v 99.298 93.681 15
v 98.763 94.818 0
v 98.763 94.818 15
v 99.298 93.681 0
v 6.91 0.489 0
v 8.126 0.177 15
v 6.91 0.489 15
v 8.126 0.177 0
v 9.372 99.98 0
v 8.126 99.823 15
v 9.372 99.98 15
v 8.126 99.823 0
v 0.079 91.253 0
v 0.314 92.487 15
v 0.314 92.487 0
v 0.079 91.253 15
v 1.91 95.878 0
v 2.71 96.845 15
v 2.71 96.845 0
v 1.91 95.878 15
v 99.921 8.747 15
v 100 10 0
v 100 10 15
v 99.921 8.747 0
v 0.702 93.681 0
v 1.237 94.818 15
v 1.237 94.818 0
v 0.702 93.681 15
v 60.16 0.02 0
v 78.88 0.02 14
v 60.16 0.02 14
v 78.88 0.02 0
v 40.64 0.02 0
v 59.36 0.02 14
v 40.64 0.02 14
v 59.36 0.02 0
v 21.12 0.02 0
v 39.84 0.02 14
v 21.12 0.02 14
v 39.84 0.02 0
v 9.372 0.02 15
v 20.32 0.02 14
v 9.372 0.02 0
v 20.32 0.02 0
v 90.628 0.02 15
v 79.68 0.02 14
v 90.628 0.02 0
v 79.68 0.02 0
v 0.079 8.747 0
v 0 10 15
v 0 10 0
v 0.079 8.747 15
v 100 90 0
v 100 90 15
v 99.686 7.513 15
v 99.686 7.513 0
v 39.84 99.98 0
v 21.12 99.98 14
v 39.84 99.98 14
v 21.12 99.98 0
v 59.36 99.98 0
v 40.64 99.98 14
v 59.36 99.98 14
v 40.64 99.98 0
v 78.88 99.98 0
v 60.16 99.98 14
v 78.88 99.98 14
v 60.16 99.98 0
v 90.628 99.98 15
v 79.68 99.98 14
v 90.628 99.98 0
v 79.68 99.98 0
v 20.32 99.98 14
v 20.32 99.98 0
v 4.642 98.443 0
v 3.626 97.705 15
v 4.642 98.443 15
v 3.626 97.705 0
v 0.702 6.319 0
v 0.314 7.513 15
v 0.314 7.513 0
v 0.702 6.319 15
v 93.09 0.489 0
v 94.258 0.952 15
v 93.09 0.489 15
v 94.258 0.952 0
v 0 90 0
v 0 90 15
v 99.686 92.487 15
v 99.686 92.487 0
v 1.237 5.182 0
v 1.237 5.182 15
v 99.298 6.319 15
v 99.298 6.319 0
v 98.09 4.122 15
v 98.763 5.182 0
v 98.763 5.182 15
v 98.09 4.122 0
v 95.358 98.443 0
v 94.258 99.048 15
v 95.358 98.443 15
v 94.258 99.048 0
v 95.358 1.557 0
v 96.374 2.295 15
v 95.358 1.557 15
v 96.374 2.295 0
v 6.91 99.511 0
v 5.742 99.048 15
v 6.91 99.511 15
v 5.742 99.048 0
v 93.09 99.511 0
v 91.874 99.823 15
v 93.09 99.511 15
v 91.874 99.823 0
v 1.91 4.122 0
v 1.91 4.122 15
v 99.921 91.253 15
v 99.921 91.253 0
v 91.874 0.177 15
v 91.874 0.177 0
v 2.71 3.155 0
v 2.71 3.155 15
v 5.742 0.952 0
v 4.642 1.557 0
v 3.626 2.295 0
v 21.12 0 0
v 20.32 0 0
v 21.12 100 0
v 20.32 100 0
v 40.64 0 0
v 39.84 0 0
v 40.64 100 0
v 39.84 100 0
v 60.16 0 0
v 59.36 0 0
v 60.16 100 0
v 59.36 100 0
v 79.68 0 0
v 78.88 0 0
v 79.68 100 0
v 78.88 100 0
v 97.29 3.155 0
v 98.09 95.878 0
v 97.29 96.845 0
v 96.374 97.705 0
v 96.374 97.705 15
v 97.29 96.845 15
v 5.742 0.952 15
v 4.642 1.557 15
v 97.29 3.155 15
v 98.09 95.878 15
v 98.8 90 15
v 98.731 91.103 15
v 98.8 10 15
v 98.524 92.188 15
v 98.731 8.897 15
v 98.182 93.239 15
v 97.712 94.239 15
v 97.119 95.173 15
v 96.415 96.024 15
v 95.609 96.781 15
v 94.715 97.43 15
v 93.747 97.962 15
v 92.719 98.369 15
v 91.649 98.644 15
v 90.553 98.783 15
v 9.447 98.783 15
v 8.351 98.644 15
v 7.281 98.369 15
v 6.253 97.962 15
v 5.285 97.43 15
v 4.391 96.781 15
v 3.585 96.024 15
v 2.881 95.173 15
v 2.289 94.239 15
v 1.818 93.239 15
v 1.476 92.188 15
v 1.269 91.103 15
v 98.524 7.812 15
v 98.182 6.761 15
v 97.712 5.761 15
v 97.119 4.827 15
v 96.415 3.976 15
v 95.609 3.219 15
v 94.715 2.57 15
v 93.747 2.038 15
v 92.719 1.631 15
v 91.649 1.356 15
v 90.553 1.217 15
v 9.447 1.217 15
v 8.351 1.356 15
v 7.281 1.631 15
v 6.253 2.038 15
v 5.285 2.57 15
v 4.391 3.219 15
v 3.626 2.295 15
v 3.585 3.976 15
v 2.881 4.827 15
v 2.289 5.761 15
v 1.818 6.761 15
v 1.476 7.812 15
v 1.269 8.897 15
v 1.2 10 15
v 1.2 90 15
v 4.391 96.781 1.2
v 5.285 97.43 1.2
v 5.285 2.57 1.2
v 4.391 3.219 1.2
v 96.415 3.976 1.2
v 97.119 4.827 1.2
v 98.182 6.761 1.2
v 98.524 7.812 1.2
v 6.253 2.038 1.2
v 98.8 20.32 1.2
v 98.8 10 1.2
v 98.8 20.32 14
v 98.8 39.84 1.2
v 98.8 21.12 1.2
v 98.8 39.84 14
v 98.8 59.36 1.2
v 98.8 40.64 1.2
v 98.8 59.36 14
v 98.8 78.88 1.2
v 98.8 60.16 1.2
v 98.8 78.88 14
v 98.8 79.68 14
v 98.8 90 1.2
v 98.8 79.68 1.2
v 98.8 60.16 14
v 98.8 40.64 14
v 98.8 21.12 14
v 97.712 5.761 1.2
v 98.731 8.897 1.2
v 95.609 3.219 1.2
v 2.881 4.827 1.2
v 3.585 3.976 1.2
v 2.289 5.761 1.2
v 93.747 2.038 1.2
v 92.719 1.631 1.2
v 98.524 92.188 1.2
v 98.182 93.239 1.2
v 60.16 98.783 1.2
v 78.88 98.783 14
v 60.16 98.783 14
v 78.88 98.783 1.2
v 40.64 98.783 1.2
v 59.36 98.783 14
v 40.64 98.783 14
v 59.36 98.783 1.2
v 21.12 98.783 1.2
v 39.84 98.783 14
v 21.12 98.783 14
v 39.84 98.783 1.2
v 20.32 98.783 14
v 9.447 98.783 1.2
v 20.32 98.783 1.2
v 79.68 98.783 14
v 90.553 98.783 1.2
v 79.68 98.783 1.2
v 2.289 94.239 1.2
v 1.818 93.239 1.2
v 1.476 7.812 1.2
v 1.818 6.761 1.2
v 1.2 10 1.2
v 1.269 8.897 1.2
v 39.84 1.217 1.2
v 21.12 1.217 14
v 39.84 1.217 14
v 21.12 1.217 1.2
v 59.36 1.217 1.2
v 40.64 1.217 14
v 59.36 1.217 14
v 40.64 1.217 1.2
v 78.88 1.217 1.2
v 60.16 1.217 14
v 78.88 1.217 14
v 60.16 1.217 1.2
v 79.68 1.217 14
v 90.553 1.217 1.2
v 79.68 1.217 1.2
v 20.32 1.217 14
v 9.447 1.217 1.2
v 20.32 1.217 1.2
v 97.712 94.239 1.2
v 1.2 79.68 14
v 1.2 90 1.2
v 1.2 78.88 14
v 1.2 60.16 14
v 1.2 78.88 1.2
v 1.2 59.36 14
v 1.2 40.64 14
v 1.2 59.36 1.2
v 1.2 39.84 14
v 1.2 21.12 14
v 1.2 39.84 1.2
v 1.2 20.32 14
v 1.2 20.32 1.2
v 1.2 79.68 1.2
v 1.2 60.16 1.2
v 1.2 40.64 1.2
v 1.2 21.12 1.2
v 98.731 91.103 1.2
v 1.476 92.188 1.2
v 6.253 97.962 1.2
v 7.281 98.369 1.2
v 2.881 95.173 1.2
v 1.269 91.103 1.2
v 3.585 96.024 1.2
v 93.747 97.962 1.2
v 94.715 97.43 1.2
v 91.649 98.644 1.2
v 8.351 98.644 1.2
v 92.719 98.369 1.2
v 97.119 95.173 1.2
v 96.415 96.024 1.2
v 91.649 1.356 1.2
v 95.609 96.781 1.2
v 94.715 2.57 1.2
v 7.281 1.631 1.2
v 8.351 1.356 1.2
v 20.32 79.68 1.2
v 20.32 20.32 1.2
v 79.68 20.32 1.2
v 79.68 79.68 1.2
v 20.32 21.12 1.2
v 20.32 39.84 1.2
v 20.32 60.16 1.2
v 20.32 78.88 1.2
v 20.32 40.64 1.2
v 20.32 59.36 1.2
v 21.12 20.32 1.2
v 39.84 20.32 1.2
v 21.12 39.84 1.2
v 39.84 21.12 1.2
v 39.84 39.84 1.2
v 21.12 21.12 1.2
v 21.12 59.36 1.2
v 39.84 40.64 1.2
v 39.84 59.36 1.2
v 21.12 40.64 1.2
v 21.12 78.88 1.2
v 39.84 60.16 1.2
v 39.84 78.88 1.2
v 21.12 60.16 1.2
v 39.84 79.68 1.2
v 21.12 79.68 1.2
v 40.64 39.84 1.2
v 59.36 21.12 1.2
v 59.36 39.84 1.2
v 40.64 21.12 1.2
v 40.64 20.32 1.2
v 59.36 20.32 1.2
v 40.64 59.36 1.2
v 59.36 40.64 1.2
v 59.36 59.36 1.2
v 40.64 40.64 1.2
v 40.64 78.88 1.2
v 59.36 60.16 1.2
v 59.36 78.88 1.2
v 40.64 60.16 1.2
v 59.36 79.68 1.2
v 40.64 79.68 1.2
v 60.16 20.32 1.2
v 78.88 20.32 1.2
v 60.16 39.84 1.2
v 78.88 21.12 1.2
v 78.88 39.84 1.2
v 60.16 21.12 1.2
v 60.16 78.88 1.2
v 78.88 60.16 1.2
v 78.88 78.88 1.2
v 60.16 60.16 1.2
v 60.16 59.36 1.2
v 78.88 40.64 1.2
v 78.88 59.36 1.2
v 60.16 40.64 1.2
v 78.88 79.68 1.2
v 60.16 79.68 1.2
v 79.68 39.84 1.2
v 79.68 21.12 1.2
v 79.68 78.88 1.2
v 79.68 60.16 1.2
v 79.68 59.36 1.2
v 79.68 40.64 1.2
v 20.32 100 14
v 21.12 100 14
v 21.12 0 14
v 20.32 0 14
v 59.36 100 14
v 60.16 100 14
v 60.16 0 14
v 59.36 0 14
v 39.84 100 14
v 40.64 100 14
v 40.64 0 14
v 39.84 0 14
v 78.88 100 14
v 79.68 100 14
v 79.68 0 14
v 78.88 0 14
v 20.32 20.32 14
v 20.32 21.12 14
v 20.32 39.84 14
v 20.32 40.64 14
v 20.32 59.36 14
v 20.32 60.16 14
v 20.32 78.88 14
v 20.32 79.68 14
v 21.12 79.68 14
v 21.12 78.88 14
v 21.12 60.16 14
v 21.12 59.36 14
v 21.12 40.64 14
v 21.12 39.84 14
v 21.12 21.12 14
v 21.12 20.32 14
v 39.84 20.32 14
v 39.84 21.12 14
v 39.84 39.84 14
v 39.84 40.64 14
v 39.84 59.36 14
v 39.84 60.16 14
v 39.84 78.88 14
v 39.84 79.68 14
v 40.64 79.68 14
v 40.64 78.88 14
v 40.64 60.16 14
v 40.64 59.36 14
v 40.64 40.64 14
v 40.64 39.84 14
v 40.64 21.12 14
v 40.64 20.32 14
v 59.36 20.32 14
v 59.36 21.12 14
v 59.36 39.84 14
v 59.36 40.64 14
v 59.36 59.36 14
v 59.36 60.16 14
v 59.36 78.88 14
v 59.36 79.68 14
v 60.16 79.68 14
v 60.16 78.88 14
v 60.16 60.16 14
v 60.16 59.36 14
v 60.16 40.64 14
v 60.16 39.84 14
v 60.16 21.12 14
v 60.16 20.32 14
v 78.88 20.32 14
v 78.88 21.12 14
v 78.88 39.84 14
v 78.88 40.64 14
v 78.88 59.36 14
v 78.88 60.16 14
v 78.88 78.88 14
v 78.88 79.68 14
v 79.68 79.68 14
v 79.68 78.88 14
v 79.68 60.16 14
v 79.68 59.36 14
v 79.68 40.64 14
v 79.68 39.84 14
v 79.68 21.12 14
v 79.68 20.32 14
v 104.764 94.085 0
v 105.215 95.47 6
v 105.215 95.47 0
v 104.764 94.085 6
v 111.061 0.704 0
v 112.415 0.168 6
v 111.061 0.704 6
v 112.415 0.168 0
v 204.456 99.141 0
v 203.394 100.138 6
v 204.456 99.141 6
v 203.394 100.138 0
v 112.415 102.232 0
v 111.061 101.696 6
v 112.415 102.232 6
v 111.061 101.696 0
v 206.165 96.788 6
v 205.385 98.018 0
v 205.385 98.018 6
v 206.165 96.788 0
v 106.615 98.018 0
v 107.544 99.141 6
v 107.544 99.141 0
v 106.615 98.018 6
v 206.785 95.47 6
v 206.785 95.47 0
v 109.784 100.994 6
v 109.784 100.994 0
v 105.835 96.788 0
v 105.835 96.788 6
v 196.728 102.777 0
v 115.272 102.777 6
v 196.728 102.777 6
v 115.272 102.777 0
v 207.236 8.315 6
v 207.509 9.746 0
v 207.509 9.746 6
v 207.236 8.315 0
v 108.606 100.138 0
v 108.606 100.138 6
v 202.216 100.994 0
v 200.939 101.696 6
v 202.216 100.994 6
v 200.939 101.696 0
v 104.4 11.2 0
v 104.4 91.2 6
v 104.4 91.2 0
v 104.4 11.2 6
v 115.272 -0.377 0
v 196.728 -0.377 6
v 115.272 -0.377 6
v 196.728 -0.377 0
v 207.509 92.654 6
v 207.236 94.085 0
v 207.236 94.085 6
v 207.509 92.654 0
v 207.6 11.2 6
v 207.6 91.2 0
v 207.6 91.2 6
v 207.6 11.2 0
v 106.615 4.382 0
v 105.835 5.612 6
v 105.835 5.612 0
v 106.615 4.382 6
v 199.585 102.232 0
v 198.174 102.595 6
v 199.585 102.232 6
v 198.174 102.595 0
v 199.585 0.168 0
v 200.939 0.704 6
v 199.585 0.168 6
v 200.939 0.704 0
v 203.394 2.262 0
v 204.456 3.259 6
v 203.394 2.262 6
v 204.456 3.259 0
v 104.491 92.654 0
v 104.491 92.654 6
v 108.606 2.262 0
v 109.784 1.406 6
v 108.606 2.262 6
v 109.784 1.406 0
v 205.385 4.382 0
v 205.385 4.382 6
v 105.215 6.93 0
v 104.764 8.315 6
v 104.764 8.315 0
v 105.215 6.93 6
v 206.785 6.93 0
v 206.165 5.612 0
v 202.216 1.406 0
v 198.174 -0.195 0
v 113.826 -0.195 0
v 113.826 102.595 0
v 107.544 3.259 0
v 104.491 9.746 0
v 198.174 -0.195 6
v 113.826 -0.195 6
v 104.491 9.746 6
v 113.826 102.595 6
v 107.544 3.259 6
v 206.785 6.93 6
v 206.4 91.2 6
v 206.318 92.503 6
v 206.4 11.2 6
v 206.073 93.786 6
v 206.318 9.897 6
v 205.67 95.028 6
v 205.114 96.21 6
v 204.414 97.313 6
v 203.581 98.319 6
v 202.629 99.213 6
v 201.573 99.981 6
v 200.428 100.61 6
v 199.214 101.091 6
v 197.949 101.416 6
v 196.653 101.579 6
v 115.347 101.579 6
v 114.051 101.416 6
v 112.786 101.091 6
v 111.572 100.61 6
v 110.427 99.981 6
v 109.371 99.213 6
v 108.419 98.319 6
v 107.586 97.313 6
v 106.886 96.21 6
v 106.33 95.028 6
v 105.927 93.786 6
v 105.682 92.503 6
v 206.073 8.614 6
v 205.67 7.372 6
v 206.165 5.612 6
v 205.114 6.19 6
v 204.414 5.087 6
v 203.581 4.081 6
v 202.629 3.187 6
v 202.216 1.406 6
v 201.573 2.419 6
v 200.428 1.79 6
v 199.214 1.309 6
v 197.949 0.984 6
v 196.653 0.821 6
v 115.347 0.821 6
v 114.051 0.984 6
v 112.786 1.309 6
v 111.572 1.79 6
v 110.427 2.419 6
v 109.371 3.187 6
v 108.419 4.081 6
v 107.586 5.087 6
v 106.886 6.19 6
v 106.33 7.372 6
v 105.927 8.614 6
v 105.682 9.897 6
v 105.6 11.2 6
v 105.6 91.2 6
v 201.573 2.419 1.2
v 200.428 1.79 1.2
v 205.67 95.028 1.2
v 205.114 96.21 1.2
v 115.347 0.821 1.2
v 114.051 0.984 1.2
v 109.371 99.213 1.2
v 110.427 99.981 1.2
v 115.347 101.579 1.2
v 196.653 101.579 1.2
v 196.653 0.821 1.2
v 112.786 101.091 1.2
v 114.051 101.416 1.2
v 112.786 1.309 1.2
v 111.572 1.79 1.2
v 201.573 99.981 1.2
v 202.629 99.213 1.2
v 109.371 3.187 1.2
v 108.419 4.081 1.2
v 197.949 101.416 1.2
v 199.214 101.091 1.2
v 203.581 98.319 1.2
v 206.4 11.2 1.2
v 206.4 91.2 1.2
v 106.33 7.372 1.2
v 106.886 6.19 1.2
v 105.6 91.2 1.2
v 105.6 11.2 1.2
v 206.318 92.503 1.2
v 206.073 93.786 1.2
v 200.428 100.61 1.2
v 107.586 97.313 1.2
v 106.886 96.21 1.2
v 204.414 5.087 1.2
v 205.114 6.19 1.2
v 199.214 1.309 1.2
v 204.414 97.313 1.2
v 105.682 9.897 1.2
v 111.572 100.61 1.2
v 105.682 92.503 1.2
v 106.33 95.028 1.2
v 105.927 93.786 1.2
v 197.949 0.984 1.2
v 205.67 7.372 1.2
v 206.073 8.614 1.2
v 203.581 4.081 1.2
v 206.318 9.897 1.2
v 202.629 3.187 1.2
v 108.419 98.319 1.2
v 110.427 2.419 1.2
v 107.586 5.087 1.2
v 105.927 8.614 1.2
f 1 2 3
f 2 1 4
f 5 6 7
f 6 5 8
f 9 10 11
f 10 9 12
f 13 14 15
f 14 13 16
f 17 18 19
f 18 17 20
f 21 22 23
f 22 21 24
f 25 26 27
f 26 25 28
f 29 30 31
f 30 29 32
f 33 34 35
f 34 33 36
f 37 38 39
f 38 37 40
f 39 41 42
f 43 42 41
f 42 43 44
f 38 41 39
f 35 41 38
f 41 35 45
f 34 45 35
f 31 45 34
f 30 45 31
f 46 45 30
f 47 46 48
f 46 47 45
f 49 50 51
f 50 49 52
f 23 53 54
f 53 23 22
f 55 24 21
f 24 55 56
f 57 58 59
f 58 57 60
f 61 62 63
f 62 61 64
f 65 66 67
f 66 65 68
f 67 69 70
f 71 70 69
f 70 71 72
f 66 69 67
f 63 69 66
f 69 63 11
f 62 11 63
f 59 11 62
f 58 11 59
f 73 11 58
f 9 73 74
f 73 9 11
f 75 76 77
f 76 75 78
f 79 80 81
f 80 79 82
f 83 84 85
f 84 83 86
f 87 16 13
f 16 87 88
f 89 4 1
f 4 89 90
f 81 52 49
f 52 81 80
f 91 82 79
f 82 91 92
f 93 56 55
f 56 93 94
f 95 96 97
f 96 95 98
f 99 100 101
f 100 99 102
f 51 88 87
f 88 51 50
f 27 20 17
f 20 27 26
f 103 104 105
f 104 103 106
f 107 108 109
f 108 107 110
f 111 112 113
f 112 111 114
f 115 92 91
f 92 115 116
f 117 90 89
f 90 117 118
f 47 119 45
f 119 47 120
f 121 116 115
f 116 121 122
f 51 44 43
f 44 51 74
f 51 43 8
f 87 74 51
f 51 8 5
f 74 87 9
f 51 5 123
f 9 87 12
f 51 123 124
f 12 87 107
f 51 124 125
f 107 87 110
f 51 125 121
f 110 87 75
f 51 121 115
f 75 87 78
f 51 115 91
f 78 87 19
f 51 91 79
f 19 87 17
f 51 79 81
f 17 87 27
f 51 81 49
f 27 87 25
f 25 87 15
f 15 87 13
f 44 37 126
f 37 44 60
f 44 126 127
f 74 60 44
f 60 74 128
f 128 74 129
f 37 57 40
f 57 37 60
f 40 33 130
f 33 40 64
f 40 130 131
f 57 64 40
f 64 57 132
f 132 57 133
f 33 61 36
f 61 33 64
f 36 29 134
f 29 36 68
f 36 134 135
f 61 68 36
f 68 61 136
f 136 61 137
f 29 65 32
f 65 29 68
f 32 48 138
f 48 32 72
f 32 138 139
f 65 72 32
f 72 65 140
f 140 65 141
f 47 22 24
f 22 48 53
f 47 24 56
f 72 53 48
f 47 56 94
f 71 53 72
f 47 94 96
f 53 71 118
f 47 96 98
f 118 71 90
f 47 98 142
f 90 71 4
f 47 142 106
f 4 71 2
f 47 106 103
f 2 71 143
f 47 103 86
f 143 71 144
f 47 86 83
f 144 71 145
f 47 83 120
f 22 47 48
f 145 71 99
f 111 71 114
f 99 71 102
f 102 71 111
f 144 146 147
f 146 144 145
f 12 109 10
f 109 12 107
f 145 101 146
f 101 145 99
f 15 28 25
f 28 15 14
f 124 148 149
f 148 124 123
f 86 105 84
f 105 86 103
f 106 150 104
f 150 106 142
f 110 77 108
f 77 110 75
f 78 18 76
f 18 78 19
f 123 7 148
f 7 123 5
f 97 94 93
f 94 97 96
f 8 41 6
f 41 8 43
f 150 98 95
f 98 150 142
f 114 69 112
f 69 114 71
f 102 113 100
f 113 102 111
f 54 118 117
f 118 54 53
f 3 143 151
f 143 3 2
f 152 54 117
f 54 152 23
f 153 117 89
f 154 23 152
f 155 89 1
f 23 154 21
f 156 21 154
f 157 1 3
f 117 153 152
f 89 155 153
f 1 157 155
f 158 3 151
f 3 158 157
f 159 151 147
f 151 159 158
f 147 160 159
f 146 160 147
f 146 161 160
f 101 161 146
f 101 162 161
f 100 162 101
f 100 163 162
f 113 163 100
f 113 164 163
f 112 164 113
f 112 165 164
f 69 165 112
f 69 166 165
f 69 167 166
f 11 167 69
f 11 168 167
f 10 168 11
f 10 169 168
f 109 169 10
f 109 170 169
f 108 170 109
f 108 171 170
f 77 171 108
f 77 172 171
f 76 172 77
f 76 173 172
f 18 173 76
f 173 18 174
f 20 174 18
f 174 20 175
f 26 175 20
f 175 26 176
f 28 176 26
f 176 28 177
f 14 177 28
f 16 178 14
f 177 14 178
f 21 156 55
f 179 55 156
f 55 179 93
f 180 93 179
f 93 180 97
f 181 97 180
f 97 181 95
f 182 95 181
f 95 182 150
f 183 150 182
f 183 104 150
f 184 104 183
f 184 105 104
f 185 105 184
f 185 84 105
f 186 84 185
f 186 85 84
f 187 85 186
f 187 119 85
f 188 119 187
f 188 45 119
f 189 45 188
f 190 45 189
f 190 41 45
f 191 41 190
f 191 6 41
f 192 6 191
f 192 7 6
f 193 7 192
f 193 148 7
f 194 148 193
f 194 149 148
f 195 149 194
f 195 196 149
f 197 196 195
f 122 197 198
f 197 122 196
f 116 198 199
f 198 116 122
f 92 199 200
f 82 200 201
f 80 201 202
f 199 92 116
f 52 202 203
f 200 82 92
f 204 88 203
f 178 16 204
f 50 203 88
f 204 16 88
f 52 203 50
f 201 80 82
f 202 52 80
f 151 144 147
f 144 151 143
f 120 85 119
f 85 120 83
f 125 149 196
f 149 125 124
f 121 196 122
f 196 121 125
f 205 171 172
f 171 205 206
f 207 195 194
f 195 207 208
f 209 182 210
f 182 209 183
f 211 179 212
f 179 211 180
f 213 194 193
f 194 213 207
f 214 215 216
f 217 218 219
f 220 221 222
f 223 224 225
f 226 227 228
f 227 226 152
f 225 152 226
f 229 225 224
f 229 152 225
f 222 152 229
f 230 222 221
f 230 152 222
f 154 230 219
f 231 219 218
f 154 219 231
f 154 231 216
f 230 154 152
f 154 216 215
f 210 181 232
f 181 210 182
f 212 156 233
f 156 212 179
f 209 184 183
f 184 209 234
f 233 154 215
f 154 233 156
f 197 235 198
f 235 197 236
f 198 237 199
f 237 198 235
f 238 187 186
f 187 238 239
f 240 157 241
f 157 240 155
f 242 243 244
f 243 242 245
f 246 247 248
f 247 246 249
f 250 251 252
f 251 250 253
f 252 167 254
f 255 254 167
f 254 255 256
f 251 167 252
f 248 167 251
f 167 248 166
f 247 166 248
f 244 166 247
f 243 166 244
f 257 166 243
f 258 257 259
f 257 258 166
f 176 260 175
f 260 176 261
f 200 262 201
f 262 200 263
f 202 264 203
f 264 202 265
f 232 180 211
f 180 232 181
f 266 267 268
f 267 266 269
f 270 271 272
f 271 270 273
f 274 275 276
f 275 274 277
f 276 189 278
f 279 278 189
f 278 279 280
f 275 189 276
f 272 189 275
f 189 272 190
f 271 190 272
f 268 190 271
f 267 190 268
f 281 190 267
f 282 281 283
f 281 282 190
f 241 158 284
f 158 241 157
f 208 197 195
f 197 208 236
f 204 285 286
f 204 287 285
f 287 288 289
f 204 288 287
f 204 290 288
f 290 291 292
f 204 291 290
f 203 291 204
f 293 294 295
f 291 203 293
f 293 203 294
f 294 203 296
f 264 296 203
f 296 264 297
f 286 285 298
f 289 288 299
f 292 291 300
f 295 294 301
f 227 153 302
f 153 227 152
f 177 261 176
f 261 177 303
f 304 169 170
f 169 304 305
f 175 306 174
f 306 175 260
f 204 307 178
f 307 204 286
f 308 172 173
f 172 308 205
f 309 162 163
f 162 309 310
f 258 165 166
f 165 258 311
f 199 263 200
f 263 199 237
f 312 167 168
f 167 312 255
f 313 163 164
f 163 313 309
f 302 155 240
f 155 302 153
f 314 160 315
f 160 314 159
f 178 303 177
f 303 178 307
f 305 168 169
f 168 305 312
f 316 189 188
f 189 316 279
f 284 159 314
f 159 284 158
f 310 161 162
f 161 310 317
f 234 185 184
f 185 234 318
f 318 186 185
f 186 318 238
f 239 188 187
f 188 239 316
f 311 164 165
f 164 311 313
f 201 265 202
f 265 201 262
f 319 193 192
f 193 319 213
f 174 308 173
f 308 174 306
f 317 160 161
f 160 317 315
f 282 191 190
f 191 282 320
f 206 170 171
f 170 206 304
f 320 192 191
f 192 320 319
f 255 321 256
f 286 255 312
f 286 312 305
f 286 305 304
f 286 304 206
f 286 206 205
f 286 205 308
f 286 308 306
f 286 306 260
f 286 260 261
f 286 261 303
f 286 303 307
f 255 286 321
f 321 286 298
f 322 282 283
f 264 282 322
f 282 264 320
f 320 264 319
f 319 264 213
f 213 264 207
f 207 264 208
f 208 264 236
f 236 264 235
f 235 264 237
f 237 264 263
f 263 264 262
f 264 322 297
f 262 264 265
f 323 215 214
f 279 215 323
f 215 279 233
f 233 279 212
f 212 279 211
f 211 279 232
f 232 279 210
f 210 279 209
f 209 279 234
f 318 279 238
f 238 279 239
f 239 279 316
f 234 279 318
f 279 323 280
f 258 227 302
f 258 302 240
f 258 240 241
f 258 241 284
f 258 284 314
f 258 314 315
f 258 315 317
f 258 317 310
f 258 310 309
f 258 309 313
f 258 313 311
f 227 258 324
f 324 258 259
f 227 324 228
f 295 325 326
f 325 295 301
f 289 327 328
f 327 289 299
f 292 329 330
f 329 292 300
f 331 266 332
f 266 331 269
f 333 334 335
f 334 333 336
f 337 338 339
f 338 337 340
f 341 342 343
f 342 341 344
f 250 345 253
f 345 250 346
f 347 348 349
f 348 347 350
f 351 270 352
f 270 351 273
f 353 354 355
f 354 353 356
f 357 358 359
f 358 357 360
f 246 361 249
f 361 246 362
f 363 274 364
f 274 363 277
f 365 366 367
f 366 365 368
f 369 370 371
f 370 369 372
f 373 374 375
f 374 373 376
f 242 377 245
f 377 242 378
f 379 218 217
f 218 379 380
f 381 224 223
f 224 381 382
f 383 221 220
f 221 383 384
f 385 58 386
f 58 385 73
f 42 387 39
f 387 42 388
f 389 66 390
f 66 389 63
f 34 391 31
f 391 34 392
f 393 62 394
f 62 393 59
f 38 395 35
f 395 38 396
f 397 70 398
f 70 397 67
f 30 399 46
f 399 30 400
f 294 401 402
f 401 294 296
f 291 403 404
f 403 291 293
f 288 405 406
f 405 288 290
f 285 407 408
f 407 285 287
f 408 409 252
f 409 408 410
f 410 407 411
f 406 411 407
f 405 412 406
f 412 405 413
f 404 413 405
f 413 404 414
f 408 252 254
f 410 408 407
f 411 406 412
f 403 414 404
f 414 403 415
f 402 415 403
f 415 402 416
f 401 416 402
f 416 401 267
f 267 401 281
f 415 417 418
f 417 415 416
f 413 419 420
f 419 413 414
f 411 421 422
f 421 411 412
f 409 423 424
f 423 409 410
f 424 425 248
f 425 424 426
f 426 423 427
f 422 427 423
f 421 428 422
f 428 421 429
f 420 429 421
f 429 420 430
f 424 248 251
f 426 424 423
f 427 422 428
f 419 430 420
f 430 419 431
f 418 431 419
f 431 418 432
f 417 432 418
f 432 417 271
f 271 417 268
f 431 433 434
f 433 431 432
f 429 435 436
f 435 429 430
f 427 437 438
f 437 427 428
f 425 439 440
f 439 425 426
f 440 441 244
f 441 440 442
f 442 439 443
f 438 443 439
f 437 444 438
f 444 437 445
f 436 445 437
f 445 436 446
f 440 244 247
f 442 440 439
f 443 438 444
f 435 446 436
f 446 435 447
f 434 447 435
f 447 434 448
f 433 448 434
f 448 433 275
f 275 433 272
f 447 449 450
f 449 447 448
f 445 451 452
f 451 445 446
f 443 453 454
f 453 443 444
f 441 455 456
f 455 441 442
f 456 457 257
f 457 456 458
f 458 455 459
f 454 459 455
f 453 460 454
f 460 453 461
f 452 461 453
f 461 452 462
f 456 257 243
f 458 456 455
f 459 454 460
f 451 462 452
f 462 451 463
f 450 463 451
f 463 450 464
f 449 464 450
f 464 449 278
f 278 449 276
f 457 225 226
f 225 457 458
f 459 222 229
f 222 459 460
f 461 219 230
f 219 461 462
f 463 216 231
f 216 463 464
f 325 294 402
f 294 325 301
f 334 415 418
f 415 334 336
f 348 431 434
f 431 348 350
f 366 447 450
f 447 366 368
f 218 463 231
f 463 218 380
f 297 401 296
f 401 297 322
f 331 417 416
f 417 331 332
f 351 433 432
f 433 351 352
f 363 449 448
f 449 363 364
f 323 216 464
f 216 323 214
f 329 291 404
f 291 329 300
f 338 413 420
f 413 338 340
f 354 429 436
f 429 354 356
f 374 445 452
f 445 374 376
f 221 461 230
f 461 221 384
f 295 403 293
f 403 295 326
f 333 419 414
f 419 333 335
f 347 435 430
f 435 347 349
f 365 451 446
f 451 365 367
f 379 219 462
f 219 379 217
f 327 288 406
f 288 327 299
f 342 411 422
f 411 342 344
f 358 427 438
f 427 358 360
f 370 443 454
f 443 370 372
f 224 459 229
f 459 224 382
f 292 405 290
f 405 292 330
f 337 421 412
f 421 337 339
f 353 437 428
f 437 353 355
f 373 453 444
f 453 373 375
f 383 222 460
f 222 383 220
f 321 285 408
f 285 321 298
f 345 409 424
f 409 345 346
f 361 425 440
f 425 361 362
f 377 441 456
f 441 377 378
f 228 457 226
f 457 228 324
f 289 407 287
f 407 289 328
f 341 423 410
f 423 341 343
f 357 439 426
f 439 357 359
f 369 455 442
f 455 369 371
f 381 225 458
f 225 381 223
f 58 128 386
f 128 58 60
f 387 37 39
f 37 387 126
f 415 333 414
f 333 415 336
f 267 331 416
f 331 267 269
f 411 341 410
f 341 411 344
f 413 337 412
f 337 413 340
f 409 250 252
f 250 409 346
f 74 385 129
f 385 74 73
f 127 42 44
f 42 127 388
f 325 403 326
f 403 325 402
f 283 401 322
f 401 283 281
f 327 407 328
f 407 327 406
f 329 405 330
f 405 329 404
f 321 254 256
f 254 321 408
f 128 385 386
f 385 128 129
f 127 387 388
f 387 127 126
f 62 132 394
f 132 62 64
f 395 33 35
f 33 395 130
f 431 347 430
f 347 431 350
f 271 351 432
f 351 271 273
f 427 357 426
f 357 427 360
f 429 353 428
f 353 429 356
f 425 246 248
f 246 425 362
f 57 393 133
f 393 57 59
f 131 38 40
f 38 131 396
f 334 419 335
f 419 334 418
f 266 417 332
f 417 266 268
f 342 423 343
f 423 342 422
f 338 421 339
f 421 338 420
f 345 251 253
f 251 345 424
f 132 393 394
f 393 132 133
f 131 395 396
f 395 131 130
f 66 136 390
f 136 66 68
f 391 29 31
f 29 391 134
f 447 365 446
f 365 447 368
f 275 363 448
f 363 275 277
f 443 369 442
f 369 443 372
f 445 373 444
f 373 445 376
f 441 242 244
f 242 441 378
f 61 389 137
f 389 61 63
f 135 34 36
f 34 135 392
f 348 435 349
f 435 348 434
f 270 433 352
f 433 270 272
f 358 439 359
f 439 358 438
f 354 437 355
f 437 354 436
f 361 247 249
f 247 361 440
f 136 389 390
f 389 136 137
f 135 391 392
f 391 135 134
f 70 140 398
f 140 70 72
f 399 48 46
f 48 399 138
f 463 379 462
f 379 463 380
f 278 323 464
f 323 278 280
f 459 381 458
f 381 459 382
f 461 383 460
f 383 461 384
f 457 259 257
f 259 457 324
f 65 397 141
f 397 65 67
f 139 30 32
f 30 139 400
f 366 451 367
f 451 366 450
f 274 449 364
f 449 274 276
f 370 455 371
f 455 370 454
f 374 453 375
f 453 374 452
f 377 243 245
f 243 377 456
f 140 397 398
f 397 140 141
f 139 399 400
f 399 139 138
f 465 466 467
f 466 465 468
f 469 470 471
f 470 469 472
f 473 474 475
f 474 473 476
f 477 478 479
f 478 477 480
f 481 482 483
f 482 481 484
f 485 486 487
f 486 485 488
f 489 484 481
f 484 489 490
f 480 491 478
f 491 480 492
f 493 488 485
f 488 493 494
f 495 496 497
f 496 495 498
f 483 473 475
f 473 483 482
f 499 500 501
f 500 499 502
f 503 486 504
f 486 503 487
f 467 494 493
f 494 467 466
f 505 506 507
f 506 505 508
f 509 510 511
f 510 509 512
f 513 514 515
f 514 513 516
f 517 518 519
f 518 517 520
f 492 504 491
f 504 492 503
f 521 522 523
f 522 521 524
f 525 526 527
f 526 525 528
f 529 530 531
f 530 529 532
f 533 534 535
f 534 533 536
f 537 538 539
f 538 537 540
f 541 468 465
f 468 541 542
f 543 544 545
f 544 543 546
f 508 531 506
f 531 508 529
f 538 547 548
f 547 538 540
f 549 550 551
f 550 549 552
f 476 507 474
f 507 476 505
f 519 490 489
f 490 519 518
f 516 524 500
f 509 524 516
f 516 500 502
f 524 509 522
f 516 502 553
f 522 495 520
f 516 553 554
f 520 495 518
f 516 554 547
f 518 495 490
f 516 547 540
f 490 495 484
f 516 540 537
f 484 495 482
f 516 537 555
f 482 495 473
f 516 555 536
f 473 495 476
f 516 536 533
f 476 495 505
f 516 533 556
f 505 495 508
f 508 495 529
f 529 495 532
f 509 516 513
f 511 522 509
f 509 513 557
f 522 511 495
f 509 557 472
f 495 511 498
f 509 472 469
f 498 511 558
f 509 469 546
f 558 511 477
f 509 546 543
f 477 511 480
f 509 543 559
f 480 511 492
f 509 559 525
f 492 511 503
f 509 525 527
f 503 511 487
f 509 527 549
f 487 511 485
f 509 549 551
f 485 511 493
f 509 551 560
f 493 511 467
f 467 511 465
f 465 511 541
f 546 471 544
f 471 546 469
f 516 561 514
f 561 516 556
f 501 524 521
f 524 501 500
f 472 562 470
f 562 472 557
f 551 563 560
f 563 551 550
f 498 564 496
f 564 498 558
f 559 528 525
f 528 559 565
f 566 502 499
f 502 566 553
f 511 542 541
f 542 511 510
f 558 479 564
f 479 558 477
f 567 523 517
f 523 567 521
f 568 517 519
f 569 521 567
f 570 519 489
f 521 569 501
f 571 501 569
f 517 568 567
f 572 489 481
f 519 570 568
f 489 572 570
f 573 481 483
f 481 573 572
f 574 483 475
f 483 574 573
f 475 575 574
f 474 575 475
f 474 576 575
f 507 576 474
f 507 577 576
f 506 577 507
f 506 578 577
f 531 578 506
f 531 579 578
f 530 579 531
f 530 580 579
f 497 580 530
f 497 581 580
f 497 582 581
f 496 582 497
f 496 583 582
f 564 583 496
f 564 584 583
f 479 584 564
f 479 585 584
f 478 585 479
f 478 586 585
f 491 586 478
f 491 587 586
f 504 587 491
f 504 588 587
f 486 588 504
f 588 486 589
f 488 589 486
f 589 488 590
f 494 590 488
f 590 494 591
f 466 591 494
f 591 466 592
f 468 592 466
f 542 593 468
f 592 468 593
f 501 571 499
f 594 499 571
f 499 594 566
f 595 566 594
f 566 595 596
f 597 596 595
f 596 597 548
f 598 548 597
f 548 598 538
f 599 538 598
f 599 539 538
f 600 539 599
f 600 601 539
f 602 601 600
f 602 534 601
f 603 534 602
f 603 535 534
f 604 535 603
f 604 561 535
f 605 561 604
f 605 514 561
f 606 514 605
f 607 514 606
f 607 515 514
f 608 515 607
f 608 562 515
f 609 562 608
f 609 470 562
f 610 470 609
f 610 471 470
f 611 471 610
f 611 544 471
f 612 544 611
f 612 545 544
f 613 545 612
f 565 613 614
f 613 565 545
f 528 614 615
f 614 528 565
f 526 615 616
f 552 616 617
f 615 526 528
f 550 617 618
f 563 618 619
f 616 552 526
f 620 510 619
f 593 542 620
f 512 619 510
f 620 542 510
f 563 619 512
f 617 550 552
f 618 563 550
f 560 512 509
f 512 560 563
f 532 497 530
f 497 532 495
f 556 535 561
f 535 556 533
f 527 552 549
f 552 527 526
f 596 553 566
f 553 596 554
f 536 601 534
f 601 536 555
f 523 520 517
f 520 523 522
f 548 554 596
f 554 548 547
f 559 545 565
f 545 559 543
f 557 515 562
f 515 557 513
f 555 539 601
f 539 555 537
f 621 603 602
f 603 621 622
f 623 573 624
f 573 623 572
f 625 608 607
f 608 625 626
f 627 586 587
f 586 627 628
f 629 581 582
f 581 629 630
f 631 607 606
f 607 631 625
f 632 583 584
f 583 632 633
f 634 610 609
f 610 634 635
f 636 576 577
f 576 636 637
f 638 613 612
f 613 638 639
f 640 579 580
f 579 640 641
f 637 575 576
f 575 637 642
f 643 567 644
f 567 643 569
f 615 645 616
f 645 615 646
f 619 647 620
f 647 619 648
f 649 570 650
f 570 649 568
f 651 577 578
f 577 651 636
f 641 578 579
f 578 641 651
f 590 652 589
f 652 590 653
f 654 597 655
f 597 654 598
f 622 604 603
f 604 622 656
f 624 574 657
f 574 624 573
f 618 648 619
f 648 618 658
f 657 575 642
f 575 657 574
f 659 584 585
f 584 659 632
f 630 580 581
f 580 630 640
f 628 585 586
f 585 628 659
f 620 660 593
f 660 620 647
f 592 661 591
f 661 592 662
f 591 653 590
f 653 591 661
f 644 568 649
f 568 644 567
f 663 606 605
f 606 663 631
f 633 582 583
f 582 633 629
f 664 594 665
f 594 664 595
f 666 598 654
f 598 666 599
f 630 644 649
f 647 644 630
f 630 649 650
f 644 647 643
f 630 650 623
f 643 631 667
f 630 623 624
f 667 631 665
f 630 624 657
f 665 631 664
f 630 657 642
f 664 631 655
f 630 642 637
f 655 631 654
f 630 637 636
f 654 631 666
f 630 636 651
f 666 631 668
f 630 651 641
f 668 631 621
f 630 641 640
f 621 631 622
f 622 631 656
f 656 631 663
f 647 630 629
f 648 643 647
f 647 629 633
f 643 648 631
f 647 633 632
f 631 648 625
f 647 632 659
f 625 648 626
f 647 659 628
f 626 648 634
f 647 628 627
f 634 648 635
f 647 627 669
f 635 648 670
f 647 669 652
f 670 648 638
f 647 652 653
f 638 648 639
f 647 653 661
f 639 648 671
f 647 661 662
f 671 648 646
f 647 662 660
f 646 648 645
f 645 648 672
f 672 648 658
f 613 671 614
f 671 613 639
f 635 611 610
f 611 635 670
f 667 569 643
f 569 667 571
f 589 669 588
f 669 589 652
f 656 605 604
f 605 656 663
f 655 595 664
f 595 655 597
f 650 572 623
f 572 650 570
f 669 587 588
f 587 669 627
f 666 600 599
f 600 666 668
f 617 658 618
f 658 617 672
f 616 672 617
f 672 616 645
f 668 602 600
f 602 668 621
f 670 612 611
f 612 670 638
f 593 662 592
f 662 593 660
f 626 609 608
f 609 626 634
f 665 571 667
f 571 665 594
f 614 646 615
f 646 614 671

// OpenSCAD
/* [Box] */
//Box height
height=15;
//Box length
length=100;
//Box width
width=100;
//Radius for corners (minimum 2)
cornerrad=10;
//Wall thickness
outwalls=1.2;
//Box thickness for floor
thickness=1.2;

/* [Box Sections] */
//Amount of sections in the length
sectionsl=5;
//Amount of sections in the width
sectionsw=5;
//Sections height
sectionsh=14;
//Inner walls thickness
inwalls=0.8;

/* [Lid] */
//Tolerance for lid
tol=0.4; 
//Lid thickness for top
lidthickness=1.2;
//Lid height
lidheight=6;

l=length-(cornerrad*2);
w=width-(cornerrad*2);

translate([cornerrad, cornerrad, 0]){
    union(){
        difference() {
            hull() {
                h = (height/2);
                translate([0,0,h]) cylinder(h=height, r=cornerrad, $fn=50, center = true);
                translate([0,l,h]) cylinder(h=height, r=cornerrad, $fn=50, center = true);
                translate([w,l,h]) cylinder(h=height, r=cornerrad, $fn=50, center = true);
                translate([w,0,h]) cylinder(h=height, r=cornerrad, $fn=50, center = true);
            }
            hull() {
                h = (height/2) + thickness;
                translate([0,0,h]) cylinder(h=height, r=cornerrad-outwalls, $fn=50, center = true);
                translate([0,l,h]) cylinder(h=height, r=cornerrad-outwalls, $fn=50, center = true);
                translate([w,l,h]) cylinder(h=height, r=cornerrad-outwalls, $fn=50, center = true);
                translate([w,0,h]) cylinder(h=height, r=cornerrad-outwalls, $fn=50, center = true);
            }
        }
        
        if( sectionsl > 0 ){
            cutl = ((length) - (outwalls*2))/sectionsl;
            for(i = [cutl : cutl : length-cutl]) {
                translate([w/2,i+outwalls-cornerrad,sectionsh/2]) cube([width,inwalls,sectionsh], center=true);
            }
        }
        
        if( sectionsw > 0 ){
            cutw = ((width) - (outwalls*2))/sectionsw;
            for(i = [cutw : cutw : width-cutw]) {
                translate([i+outwalls-cornerrad,l/2,sectionsh/2]) cube([inwalls,length,sectionsh], center=true);
            }
        }
        
    }

    translate([w + (cornerrad*2) + 6, outwalls, 0]){
        difference() {
            hull() {
                h = (lidheight/2);
                translate([0,0,h]) cylinder(h=lidheight, r=cornerrad+tol+outwalls, $fn=50, center = true);
                translate([0,l,h]) cylinder(h=lidheight, r=cornerrad+tol+outwalls, $fn=50, center = true);
                translate([w,l,h]) cylinder(h=lidheight, r=cornerrad+tol+outwalls, $fn=50, center = true);
                translate([w,0,h]) cylinder(h=lidheight, r=cornerrad+tol+outwalls, $fn=50, center = true);
            }
            
            hull() {
                h = (lidheight/2) + lidthickness;
                translate([0,0,h]) cylinder(h=lidheight, r=(cornerrad)+tol, $fn=50, center = true);
                translate([0,l,h]) cylinder(h=lidheight, r=(cornerrad)+tol, $fn=50, center = true);
                translate([w,l,h]) cylinder(h=lidheight, r=(cornerrad)+tol, $fn=50, center = true);
                translate([w,0,h]) cylinder(h=lidheight, r=(cornerrad)+tol, $fn=50, center = true);
            }
        }
    }
}
